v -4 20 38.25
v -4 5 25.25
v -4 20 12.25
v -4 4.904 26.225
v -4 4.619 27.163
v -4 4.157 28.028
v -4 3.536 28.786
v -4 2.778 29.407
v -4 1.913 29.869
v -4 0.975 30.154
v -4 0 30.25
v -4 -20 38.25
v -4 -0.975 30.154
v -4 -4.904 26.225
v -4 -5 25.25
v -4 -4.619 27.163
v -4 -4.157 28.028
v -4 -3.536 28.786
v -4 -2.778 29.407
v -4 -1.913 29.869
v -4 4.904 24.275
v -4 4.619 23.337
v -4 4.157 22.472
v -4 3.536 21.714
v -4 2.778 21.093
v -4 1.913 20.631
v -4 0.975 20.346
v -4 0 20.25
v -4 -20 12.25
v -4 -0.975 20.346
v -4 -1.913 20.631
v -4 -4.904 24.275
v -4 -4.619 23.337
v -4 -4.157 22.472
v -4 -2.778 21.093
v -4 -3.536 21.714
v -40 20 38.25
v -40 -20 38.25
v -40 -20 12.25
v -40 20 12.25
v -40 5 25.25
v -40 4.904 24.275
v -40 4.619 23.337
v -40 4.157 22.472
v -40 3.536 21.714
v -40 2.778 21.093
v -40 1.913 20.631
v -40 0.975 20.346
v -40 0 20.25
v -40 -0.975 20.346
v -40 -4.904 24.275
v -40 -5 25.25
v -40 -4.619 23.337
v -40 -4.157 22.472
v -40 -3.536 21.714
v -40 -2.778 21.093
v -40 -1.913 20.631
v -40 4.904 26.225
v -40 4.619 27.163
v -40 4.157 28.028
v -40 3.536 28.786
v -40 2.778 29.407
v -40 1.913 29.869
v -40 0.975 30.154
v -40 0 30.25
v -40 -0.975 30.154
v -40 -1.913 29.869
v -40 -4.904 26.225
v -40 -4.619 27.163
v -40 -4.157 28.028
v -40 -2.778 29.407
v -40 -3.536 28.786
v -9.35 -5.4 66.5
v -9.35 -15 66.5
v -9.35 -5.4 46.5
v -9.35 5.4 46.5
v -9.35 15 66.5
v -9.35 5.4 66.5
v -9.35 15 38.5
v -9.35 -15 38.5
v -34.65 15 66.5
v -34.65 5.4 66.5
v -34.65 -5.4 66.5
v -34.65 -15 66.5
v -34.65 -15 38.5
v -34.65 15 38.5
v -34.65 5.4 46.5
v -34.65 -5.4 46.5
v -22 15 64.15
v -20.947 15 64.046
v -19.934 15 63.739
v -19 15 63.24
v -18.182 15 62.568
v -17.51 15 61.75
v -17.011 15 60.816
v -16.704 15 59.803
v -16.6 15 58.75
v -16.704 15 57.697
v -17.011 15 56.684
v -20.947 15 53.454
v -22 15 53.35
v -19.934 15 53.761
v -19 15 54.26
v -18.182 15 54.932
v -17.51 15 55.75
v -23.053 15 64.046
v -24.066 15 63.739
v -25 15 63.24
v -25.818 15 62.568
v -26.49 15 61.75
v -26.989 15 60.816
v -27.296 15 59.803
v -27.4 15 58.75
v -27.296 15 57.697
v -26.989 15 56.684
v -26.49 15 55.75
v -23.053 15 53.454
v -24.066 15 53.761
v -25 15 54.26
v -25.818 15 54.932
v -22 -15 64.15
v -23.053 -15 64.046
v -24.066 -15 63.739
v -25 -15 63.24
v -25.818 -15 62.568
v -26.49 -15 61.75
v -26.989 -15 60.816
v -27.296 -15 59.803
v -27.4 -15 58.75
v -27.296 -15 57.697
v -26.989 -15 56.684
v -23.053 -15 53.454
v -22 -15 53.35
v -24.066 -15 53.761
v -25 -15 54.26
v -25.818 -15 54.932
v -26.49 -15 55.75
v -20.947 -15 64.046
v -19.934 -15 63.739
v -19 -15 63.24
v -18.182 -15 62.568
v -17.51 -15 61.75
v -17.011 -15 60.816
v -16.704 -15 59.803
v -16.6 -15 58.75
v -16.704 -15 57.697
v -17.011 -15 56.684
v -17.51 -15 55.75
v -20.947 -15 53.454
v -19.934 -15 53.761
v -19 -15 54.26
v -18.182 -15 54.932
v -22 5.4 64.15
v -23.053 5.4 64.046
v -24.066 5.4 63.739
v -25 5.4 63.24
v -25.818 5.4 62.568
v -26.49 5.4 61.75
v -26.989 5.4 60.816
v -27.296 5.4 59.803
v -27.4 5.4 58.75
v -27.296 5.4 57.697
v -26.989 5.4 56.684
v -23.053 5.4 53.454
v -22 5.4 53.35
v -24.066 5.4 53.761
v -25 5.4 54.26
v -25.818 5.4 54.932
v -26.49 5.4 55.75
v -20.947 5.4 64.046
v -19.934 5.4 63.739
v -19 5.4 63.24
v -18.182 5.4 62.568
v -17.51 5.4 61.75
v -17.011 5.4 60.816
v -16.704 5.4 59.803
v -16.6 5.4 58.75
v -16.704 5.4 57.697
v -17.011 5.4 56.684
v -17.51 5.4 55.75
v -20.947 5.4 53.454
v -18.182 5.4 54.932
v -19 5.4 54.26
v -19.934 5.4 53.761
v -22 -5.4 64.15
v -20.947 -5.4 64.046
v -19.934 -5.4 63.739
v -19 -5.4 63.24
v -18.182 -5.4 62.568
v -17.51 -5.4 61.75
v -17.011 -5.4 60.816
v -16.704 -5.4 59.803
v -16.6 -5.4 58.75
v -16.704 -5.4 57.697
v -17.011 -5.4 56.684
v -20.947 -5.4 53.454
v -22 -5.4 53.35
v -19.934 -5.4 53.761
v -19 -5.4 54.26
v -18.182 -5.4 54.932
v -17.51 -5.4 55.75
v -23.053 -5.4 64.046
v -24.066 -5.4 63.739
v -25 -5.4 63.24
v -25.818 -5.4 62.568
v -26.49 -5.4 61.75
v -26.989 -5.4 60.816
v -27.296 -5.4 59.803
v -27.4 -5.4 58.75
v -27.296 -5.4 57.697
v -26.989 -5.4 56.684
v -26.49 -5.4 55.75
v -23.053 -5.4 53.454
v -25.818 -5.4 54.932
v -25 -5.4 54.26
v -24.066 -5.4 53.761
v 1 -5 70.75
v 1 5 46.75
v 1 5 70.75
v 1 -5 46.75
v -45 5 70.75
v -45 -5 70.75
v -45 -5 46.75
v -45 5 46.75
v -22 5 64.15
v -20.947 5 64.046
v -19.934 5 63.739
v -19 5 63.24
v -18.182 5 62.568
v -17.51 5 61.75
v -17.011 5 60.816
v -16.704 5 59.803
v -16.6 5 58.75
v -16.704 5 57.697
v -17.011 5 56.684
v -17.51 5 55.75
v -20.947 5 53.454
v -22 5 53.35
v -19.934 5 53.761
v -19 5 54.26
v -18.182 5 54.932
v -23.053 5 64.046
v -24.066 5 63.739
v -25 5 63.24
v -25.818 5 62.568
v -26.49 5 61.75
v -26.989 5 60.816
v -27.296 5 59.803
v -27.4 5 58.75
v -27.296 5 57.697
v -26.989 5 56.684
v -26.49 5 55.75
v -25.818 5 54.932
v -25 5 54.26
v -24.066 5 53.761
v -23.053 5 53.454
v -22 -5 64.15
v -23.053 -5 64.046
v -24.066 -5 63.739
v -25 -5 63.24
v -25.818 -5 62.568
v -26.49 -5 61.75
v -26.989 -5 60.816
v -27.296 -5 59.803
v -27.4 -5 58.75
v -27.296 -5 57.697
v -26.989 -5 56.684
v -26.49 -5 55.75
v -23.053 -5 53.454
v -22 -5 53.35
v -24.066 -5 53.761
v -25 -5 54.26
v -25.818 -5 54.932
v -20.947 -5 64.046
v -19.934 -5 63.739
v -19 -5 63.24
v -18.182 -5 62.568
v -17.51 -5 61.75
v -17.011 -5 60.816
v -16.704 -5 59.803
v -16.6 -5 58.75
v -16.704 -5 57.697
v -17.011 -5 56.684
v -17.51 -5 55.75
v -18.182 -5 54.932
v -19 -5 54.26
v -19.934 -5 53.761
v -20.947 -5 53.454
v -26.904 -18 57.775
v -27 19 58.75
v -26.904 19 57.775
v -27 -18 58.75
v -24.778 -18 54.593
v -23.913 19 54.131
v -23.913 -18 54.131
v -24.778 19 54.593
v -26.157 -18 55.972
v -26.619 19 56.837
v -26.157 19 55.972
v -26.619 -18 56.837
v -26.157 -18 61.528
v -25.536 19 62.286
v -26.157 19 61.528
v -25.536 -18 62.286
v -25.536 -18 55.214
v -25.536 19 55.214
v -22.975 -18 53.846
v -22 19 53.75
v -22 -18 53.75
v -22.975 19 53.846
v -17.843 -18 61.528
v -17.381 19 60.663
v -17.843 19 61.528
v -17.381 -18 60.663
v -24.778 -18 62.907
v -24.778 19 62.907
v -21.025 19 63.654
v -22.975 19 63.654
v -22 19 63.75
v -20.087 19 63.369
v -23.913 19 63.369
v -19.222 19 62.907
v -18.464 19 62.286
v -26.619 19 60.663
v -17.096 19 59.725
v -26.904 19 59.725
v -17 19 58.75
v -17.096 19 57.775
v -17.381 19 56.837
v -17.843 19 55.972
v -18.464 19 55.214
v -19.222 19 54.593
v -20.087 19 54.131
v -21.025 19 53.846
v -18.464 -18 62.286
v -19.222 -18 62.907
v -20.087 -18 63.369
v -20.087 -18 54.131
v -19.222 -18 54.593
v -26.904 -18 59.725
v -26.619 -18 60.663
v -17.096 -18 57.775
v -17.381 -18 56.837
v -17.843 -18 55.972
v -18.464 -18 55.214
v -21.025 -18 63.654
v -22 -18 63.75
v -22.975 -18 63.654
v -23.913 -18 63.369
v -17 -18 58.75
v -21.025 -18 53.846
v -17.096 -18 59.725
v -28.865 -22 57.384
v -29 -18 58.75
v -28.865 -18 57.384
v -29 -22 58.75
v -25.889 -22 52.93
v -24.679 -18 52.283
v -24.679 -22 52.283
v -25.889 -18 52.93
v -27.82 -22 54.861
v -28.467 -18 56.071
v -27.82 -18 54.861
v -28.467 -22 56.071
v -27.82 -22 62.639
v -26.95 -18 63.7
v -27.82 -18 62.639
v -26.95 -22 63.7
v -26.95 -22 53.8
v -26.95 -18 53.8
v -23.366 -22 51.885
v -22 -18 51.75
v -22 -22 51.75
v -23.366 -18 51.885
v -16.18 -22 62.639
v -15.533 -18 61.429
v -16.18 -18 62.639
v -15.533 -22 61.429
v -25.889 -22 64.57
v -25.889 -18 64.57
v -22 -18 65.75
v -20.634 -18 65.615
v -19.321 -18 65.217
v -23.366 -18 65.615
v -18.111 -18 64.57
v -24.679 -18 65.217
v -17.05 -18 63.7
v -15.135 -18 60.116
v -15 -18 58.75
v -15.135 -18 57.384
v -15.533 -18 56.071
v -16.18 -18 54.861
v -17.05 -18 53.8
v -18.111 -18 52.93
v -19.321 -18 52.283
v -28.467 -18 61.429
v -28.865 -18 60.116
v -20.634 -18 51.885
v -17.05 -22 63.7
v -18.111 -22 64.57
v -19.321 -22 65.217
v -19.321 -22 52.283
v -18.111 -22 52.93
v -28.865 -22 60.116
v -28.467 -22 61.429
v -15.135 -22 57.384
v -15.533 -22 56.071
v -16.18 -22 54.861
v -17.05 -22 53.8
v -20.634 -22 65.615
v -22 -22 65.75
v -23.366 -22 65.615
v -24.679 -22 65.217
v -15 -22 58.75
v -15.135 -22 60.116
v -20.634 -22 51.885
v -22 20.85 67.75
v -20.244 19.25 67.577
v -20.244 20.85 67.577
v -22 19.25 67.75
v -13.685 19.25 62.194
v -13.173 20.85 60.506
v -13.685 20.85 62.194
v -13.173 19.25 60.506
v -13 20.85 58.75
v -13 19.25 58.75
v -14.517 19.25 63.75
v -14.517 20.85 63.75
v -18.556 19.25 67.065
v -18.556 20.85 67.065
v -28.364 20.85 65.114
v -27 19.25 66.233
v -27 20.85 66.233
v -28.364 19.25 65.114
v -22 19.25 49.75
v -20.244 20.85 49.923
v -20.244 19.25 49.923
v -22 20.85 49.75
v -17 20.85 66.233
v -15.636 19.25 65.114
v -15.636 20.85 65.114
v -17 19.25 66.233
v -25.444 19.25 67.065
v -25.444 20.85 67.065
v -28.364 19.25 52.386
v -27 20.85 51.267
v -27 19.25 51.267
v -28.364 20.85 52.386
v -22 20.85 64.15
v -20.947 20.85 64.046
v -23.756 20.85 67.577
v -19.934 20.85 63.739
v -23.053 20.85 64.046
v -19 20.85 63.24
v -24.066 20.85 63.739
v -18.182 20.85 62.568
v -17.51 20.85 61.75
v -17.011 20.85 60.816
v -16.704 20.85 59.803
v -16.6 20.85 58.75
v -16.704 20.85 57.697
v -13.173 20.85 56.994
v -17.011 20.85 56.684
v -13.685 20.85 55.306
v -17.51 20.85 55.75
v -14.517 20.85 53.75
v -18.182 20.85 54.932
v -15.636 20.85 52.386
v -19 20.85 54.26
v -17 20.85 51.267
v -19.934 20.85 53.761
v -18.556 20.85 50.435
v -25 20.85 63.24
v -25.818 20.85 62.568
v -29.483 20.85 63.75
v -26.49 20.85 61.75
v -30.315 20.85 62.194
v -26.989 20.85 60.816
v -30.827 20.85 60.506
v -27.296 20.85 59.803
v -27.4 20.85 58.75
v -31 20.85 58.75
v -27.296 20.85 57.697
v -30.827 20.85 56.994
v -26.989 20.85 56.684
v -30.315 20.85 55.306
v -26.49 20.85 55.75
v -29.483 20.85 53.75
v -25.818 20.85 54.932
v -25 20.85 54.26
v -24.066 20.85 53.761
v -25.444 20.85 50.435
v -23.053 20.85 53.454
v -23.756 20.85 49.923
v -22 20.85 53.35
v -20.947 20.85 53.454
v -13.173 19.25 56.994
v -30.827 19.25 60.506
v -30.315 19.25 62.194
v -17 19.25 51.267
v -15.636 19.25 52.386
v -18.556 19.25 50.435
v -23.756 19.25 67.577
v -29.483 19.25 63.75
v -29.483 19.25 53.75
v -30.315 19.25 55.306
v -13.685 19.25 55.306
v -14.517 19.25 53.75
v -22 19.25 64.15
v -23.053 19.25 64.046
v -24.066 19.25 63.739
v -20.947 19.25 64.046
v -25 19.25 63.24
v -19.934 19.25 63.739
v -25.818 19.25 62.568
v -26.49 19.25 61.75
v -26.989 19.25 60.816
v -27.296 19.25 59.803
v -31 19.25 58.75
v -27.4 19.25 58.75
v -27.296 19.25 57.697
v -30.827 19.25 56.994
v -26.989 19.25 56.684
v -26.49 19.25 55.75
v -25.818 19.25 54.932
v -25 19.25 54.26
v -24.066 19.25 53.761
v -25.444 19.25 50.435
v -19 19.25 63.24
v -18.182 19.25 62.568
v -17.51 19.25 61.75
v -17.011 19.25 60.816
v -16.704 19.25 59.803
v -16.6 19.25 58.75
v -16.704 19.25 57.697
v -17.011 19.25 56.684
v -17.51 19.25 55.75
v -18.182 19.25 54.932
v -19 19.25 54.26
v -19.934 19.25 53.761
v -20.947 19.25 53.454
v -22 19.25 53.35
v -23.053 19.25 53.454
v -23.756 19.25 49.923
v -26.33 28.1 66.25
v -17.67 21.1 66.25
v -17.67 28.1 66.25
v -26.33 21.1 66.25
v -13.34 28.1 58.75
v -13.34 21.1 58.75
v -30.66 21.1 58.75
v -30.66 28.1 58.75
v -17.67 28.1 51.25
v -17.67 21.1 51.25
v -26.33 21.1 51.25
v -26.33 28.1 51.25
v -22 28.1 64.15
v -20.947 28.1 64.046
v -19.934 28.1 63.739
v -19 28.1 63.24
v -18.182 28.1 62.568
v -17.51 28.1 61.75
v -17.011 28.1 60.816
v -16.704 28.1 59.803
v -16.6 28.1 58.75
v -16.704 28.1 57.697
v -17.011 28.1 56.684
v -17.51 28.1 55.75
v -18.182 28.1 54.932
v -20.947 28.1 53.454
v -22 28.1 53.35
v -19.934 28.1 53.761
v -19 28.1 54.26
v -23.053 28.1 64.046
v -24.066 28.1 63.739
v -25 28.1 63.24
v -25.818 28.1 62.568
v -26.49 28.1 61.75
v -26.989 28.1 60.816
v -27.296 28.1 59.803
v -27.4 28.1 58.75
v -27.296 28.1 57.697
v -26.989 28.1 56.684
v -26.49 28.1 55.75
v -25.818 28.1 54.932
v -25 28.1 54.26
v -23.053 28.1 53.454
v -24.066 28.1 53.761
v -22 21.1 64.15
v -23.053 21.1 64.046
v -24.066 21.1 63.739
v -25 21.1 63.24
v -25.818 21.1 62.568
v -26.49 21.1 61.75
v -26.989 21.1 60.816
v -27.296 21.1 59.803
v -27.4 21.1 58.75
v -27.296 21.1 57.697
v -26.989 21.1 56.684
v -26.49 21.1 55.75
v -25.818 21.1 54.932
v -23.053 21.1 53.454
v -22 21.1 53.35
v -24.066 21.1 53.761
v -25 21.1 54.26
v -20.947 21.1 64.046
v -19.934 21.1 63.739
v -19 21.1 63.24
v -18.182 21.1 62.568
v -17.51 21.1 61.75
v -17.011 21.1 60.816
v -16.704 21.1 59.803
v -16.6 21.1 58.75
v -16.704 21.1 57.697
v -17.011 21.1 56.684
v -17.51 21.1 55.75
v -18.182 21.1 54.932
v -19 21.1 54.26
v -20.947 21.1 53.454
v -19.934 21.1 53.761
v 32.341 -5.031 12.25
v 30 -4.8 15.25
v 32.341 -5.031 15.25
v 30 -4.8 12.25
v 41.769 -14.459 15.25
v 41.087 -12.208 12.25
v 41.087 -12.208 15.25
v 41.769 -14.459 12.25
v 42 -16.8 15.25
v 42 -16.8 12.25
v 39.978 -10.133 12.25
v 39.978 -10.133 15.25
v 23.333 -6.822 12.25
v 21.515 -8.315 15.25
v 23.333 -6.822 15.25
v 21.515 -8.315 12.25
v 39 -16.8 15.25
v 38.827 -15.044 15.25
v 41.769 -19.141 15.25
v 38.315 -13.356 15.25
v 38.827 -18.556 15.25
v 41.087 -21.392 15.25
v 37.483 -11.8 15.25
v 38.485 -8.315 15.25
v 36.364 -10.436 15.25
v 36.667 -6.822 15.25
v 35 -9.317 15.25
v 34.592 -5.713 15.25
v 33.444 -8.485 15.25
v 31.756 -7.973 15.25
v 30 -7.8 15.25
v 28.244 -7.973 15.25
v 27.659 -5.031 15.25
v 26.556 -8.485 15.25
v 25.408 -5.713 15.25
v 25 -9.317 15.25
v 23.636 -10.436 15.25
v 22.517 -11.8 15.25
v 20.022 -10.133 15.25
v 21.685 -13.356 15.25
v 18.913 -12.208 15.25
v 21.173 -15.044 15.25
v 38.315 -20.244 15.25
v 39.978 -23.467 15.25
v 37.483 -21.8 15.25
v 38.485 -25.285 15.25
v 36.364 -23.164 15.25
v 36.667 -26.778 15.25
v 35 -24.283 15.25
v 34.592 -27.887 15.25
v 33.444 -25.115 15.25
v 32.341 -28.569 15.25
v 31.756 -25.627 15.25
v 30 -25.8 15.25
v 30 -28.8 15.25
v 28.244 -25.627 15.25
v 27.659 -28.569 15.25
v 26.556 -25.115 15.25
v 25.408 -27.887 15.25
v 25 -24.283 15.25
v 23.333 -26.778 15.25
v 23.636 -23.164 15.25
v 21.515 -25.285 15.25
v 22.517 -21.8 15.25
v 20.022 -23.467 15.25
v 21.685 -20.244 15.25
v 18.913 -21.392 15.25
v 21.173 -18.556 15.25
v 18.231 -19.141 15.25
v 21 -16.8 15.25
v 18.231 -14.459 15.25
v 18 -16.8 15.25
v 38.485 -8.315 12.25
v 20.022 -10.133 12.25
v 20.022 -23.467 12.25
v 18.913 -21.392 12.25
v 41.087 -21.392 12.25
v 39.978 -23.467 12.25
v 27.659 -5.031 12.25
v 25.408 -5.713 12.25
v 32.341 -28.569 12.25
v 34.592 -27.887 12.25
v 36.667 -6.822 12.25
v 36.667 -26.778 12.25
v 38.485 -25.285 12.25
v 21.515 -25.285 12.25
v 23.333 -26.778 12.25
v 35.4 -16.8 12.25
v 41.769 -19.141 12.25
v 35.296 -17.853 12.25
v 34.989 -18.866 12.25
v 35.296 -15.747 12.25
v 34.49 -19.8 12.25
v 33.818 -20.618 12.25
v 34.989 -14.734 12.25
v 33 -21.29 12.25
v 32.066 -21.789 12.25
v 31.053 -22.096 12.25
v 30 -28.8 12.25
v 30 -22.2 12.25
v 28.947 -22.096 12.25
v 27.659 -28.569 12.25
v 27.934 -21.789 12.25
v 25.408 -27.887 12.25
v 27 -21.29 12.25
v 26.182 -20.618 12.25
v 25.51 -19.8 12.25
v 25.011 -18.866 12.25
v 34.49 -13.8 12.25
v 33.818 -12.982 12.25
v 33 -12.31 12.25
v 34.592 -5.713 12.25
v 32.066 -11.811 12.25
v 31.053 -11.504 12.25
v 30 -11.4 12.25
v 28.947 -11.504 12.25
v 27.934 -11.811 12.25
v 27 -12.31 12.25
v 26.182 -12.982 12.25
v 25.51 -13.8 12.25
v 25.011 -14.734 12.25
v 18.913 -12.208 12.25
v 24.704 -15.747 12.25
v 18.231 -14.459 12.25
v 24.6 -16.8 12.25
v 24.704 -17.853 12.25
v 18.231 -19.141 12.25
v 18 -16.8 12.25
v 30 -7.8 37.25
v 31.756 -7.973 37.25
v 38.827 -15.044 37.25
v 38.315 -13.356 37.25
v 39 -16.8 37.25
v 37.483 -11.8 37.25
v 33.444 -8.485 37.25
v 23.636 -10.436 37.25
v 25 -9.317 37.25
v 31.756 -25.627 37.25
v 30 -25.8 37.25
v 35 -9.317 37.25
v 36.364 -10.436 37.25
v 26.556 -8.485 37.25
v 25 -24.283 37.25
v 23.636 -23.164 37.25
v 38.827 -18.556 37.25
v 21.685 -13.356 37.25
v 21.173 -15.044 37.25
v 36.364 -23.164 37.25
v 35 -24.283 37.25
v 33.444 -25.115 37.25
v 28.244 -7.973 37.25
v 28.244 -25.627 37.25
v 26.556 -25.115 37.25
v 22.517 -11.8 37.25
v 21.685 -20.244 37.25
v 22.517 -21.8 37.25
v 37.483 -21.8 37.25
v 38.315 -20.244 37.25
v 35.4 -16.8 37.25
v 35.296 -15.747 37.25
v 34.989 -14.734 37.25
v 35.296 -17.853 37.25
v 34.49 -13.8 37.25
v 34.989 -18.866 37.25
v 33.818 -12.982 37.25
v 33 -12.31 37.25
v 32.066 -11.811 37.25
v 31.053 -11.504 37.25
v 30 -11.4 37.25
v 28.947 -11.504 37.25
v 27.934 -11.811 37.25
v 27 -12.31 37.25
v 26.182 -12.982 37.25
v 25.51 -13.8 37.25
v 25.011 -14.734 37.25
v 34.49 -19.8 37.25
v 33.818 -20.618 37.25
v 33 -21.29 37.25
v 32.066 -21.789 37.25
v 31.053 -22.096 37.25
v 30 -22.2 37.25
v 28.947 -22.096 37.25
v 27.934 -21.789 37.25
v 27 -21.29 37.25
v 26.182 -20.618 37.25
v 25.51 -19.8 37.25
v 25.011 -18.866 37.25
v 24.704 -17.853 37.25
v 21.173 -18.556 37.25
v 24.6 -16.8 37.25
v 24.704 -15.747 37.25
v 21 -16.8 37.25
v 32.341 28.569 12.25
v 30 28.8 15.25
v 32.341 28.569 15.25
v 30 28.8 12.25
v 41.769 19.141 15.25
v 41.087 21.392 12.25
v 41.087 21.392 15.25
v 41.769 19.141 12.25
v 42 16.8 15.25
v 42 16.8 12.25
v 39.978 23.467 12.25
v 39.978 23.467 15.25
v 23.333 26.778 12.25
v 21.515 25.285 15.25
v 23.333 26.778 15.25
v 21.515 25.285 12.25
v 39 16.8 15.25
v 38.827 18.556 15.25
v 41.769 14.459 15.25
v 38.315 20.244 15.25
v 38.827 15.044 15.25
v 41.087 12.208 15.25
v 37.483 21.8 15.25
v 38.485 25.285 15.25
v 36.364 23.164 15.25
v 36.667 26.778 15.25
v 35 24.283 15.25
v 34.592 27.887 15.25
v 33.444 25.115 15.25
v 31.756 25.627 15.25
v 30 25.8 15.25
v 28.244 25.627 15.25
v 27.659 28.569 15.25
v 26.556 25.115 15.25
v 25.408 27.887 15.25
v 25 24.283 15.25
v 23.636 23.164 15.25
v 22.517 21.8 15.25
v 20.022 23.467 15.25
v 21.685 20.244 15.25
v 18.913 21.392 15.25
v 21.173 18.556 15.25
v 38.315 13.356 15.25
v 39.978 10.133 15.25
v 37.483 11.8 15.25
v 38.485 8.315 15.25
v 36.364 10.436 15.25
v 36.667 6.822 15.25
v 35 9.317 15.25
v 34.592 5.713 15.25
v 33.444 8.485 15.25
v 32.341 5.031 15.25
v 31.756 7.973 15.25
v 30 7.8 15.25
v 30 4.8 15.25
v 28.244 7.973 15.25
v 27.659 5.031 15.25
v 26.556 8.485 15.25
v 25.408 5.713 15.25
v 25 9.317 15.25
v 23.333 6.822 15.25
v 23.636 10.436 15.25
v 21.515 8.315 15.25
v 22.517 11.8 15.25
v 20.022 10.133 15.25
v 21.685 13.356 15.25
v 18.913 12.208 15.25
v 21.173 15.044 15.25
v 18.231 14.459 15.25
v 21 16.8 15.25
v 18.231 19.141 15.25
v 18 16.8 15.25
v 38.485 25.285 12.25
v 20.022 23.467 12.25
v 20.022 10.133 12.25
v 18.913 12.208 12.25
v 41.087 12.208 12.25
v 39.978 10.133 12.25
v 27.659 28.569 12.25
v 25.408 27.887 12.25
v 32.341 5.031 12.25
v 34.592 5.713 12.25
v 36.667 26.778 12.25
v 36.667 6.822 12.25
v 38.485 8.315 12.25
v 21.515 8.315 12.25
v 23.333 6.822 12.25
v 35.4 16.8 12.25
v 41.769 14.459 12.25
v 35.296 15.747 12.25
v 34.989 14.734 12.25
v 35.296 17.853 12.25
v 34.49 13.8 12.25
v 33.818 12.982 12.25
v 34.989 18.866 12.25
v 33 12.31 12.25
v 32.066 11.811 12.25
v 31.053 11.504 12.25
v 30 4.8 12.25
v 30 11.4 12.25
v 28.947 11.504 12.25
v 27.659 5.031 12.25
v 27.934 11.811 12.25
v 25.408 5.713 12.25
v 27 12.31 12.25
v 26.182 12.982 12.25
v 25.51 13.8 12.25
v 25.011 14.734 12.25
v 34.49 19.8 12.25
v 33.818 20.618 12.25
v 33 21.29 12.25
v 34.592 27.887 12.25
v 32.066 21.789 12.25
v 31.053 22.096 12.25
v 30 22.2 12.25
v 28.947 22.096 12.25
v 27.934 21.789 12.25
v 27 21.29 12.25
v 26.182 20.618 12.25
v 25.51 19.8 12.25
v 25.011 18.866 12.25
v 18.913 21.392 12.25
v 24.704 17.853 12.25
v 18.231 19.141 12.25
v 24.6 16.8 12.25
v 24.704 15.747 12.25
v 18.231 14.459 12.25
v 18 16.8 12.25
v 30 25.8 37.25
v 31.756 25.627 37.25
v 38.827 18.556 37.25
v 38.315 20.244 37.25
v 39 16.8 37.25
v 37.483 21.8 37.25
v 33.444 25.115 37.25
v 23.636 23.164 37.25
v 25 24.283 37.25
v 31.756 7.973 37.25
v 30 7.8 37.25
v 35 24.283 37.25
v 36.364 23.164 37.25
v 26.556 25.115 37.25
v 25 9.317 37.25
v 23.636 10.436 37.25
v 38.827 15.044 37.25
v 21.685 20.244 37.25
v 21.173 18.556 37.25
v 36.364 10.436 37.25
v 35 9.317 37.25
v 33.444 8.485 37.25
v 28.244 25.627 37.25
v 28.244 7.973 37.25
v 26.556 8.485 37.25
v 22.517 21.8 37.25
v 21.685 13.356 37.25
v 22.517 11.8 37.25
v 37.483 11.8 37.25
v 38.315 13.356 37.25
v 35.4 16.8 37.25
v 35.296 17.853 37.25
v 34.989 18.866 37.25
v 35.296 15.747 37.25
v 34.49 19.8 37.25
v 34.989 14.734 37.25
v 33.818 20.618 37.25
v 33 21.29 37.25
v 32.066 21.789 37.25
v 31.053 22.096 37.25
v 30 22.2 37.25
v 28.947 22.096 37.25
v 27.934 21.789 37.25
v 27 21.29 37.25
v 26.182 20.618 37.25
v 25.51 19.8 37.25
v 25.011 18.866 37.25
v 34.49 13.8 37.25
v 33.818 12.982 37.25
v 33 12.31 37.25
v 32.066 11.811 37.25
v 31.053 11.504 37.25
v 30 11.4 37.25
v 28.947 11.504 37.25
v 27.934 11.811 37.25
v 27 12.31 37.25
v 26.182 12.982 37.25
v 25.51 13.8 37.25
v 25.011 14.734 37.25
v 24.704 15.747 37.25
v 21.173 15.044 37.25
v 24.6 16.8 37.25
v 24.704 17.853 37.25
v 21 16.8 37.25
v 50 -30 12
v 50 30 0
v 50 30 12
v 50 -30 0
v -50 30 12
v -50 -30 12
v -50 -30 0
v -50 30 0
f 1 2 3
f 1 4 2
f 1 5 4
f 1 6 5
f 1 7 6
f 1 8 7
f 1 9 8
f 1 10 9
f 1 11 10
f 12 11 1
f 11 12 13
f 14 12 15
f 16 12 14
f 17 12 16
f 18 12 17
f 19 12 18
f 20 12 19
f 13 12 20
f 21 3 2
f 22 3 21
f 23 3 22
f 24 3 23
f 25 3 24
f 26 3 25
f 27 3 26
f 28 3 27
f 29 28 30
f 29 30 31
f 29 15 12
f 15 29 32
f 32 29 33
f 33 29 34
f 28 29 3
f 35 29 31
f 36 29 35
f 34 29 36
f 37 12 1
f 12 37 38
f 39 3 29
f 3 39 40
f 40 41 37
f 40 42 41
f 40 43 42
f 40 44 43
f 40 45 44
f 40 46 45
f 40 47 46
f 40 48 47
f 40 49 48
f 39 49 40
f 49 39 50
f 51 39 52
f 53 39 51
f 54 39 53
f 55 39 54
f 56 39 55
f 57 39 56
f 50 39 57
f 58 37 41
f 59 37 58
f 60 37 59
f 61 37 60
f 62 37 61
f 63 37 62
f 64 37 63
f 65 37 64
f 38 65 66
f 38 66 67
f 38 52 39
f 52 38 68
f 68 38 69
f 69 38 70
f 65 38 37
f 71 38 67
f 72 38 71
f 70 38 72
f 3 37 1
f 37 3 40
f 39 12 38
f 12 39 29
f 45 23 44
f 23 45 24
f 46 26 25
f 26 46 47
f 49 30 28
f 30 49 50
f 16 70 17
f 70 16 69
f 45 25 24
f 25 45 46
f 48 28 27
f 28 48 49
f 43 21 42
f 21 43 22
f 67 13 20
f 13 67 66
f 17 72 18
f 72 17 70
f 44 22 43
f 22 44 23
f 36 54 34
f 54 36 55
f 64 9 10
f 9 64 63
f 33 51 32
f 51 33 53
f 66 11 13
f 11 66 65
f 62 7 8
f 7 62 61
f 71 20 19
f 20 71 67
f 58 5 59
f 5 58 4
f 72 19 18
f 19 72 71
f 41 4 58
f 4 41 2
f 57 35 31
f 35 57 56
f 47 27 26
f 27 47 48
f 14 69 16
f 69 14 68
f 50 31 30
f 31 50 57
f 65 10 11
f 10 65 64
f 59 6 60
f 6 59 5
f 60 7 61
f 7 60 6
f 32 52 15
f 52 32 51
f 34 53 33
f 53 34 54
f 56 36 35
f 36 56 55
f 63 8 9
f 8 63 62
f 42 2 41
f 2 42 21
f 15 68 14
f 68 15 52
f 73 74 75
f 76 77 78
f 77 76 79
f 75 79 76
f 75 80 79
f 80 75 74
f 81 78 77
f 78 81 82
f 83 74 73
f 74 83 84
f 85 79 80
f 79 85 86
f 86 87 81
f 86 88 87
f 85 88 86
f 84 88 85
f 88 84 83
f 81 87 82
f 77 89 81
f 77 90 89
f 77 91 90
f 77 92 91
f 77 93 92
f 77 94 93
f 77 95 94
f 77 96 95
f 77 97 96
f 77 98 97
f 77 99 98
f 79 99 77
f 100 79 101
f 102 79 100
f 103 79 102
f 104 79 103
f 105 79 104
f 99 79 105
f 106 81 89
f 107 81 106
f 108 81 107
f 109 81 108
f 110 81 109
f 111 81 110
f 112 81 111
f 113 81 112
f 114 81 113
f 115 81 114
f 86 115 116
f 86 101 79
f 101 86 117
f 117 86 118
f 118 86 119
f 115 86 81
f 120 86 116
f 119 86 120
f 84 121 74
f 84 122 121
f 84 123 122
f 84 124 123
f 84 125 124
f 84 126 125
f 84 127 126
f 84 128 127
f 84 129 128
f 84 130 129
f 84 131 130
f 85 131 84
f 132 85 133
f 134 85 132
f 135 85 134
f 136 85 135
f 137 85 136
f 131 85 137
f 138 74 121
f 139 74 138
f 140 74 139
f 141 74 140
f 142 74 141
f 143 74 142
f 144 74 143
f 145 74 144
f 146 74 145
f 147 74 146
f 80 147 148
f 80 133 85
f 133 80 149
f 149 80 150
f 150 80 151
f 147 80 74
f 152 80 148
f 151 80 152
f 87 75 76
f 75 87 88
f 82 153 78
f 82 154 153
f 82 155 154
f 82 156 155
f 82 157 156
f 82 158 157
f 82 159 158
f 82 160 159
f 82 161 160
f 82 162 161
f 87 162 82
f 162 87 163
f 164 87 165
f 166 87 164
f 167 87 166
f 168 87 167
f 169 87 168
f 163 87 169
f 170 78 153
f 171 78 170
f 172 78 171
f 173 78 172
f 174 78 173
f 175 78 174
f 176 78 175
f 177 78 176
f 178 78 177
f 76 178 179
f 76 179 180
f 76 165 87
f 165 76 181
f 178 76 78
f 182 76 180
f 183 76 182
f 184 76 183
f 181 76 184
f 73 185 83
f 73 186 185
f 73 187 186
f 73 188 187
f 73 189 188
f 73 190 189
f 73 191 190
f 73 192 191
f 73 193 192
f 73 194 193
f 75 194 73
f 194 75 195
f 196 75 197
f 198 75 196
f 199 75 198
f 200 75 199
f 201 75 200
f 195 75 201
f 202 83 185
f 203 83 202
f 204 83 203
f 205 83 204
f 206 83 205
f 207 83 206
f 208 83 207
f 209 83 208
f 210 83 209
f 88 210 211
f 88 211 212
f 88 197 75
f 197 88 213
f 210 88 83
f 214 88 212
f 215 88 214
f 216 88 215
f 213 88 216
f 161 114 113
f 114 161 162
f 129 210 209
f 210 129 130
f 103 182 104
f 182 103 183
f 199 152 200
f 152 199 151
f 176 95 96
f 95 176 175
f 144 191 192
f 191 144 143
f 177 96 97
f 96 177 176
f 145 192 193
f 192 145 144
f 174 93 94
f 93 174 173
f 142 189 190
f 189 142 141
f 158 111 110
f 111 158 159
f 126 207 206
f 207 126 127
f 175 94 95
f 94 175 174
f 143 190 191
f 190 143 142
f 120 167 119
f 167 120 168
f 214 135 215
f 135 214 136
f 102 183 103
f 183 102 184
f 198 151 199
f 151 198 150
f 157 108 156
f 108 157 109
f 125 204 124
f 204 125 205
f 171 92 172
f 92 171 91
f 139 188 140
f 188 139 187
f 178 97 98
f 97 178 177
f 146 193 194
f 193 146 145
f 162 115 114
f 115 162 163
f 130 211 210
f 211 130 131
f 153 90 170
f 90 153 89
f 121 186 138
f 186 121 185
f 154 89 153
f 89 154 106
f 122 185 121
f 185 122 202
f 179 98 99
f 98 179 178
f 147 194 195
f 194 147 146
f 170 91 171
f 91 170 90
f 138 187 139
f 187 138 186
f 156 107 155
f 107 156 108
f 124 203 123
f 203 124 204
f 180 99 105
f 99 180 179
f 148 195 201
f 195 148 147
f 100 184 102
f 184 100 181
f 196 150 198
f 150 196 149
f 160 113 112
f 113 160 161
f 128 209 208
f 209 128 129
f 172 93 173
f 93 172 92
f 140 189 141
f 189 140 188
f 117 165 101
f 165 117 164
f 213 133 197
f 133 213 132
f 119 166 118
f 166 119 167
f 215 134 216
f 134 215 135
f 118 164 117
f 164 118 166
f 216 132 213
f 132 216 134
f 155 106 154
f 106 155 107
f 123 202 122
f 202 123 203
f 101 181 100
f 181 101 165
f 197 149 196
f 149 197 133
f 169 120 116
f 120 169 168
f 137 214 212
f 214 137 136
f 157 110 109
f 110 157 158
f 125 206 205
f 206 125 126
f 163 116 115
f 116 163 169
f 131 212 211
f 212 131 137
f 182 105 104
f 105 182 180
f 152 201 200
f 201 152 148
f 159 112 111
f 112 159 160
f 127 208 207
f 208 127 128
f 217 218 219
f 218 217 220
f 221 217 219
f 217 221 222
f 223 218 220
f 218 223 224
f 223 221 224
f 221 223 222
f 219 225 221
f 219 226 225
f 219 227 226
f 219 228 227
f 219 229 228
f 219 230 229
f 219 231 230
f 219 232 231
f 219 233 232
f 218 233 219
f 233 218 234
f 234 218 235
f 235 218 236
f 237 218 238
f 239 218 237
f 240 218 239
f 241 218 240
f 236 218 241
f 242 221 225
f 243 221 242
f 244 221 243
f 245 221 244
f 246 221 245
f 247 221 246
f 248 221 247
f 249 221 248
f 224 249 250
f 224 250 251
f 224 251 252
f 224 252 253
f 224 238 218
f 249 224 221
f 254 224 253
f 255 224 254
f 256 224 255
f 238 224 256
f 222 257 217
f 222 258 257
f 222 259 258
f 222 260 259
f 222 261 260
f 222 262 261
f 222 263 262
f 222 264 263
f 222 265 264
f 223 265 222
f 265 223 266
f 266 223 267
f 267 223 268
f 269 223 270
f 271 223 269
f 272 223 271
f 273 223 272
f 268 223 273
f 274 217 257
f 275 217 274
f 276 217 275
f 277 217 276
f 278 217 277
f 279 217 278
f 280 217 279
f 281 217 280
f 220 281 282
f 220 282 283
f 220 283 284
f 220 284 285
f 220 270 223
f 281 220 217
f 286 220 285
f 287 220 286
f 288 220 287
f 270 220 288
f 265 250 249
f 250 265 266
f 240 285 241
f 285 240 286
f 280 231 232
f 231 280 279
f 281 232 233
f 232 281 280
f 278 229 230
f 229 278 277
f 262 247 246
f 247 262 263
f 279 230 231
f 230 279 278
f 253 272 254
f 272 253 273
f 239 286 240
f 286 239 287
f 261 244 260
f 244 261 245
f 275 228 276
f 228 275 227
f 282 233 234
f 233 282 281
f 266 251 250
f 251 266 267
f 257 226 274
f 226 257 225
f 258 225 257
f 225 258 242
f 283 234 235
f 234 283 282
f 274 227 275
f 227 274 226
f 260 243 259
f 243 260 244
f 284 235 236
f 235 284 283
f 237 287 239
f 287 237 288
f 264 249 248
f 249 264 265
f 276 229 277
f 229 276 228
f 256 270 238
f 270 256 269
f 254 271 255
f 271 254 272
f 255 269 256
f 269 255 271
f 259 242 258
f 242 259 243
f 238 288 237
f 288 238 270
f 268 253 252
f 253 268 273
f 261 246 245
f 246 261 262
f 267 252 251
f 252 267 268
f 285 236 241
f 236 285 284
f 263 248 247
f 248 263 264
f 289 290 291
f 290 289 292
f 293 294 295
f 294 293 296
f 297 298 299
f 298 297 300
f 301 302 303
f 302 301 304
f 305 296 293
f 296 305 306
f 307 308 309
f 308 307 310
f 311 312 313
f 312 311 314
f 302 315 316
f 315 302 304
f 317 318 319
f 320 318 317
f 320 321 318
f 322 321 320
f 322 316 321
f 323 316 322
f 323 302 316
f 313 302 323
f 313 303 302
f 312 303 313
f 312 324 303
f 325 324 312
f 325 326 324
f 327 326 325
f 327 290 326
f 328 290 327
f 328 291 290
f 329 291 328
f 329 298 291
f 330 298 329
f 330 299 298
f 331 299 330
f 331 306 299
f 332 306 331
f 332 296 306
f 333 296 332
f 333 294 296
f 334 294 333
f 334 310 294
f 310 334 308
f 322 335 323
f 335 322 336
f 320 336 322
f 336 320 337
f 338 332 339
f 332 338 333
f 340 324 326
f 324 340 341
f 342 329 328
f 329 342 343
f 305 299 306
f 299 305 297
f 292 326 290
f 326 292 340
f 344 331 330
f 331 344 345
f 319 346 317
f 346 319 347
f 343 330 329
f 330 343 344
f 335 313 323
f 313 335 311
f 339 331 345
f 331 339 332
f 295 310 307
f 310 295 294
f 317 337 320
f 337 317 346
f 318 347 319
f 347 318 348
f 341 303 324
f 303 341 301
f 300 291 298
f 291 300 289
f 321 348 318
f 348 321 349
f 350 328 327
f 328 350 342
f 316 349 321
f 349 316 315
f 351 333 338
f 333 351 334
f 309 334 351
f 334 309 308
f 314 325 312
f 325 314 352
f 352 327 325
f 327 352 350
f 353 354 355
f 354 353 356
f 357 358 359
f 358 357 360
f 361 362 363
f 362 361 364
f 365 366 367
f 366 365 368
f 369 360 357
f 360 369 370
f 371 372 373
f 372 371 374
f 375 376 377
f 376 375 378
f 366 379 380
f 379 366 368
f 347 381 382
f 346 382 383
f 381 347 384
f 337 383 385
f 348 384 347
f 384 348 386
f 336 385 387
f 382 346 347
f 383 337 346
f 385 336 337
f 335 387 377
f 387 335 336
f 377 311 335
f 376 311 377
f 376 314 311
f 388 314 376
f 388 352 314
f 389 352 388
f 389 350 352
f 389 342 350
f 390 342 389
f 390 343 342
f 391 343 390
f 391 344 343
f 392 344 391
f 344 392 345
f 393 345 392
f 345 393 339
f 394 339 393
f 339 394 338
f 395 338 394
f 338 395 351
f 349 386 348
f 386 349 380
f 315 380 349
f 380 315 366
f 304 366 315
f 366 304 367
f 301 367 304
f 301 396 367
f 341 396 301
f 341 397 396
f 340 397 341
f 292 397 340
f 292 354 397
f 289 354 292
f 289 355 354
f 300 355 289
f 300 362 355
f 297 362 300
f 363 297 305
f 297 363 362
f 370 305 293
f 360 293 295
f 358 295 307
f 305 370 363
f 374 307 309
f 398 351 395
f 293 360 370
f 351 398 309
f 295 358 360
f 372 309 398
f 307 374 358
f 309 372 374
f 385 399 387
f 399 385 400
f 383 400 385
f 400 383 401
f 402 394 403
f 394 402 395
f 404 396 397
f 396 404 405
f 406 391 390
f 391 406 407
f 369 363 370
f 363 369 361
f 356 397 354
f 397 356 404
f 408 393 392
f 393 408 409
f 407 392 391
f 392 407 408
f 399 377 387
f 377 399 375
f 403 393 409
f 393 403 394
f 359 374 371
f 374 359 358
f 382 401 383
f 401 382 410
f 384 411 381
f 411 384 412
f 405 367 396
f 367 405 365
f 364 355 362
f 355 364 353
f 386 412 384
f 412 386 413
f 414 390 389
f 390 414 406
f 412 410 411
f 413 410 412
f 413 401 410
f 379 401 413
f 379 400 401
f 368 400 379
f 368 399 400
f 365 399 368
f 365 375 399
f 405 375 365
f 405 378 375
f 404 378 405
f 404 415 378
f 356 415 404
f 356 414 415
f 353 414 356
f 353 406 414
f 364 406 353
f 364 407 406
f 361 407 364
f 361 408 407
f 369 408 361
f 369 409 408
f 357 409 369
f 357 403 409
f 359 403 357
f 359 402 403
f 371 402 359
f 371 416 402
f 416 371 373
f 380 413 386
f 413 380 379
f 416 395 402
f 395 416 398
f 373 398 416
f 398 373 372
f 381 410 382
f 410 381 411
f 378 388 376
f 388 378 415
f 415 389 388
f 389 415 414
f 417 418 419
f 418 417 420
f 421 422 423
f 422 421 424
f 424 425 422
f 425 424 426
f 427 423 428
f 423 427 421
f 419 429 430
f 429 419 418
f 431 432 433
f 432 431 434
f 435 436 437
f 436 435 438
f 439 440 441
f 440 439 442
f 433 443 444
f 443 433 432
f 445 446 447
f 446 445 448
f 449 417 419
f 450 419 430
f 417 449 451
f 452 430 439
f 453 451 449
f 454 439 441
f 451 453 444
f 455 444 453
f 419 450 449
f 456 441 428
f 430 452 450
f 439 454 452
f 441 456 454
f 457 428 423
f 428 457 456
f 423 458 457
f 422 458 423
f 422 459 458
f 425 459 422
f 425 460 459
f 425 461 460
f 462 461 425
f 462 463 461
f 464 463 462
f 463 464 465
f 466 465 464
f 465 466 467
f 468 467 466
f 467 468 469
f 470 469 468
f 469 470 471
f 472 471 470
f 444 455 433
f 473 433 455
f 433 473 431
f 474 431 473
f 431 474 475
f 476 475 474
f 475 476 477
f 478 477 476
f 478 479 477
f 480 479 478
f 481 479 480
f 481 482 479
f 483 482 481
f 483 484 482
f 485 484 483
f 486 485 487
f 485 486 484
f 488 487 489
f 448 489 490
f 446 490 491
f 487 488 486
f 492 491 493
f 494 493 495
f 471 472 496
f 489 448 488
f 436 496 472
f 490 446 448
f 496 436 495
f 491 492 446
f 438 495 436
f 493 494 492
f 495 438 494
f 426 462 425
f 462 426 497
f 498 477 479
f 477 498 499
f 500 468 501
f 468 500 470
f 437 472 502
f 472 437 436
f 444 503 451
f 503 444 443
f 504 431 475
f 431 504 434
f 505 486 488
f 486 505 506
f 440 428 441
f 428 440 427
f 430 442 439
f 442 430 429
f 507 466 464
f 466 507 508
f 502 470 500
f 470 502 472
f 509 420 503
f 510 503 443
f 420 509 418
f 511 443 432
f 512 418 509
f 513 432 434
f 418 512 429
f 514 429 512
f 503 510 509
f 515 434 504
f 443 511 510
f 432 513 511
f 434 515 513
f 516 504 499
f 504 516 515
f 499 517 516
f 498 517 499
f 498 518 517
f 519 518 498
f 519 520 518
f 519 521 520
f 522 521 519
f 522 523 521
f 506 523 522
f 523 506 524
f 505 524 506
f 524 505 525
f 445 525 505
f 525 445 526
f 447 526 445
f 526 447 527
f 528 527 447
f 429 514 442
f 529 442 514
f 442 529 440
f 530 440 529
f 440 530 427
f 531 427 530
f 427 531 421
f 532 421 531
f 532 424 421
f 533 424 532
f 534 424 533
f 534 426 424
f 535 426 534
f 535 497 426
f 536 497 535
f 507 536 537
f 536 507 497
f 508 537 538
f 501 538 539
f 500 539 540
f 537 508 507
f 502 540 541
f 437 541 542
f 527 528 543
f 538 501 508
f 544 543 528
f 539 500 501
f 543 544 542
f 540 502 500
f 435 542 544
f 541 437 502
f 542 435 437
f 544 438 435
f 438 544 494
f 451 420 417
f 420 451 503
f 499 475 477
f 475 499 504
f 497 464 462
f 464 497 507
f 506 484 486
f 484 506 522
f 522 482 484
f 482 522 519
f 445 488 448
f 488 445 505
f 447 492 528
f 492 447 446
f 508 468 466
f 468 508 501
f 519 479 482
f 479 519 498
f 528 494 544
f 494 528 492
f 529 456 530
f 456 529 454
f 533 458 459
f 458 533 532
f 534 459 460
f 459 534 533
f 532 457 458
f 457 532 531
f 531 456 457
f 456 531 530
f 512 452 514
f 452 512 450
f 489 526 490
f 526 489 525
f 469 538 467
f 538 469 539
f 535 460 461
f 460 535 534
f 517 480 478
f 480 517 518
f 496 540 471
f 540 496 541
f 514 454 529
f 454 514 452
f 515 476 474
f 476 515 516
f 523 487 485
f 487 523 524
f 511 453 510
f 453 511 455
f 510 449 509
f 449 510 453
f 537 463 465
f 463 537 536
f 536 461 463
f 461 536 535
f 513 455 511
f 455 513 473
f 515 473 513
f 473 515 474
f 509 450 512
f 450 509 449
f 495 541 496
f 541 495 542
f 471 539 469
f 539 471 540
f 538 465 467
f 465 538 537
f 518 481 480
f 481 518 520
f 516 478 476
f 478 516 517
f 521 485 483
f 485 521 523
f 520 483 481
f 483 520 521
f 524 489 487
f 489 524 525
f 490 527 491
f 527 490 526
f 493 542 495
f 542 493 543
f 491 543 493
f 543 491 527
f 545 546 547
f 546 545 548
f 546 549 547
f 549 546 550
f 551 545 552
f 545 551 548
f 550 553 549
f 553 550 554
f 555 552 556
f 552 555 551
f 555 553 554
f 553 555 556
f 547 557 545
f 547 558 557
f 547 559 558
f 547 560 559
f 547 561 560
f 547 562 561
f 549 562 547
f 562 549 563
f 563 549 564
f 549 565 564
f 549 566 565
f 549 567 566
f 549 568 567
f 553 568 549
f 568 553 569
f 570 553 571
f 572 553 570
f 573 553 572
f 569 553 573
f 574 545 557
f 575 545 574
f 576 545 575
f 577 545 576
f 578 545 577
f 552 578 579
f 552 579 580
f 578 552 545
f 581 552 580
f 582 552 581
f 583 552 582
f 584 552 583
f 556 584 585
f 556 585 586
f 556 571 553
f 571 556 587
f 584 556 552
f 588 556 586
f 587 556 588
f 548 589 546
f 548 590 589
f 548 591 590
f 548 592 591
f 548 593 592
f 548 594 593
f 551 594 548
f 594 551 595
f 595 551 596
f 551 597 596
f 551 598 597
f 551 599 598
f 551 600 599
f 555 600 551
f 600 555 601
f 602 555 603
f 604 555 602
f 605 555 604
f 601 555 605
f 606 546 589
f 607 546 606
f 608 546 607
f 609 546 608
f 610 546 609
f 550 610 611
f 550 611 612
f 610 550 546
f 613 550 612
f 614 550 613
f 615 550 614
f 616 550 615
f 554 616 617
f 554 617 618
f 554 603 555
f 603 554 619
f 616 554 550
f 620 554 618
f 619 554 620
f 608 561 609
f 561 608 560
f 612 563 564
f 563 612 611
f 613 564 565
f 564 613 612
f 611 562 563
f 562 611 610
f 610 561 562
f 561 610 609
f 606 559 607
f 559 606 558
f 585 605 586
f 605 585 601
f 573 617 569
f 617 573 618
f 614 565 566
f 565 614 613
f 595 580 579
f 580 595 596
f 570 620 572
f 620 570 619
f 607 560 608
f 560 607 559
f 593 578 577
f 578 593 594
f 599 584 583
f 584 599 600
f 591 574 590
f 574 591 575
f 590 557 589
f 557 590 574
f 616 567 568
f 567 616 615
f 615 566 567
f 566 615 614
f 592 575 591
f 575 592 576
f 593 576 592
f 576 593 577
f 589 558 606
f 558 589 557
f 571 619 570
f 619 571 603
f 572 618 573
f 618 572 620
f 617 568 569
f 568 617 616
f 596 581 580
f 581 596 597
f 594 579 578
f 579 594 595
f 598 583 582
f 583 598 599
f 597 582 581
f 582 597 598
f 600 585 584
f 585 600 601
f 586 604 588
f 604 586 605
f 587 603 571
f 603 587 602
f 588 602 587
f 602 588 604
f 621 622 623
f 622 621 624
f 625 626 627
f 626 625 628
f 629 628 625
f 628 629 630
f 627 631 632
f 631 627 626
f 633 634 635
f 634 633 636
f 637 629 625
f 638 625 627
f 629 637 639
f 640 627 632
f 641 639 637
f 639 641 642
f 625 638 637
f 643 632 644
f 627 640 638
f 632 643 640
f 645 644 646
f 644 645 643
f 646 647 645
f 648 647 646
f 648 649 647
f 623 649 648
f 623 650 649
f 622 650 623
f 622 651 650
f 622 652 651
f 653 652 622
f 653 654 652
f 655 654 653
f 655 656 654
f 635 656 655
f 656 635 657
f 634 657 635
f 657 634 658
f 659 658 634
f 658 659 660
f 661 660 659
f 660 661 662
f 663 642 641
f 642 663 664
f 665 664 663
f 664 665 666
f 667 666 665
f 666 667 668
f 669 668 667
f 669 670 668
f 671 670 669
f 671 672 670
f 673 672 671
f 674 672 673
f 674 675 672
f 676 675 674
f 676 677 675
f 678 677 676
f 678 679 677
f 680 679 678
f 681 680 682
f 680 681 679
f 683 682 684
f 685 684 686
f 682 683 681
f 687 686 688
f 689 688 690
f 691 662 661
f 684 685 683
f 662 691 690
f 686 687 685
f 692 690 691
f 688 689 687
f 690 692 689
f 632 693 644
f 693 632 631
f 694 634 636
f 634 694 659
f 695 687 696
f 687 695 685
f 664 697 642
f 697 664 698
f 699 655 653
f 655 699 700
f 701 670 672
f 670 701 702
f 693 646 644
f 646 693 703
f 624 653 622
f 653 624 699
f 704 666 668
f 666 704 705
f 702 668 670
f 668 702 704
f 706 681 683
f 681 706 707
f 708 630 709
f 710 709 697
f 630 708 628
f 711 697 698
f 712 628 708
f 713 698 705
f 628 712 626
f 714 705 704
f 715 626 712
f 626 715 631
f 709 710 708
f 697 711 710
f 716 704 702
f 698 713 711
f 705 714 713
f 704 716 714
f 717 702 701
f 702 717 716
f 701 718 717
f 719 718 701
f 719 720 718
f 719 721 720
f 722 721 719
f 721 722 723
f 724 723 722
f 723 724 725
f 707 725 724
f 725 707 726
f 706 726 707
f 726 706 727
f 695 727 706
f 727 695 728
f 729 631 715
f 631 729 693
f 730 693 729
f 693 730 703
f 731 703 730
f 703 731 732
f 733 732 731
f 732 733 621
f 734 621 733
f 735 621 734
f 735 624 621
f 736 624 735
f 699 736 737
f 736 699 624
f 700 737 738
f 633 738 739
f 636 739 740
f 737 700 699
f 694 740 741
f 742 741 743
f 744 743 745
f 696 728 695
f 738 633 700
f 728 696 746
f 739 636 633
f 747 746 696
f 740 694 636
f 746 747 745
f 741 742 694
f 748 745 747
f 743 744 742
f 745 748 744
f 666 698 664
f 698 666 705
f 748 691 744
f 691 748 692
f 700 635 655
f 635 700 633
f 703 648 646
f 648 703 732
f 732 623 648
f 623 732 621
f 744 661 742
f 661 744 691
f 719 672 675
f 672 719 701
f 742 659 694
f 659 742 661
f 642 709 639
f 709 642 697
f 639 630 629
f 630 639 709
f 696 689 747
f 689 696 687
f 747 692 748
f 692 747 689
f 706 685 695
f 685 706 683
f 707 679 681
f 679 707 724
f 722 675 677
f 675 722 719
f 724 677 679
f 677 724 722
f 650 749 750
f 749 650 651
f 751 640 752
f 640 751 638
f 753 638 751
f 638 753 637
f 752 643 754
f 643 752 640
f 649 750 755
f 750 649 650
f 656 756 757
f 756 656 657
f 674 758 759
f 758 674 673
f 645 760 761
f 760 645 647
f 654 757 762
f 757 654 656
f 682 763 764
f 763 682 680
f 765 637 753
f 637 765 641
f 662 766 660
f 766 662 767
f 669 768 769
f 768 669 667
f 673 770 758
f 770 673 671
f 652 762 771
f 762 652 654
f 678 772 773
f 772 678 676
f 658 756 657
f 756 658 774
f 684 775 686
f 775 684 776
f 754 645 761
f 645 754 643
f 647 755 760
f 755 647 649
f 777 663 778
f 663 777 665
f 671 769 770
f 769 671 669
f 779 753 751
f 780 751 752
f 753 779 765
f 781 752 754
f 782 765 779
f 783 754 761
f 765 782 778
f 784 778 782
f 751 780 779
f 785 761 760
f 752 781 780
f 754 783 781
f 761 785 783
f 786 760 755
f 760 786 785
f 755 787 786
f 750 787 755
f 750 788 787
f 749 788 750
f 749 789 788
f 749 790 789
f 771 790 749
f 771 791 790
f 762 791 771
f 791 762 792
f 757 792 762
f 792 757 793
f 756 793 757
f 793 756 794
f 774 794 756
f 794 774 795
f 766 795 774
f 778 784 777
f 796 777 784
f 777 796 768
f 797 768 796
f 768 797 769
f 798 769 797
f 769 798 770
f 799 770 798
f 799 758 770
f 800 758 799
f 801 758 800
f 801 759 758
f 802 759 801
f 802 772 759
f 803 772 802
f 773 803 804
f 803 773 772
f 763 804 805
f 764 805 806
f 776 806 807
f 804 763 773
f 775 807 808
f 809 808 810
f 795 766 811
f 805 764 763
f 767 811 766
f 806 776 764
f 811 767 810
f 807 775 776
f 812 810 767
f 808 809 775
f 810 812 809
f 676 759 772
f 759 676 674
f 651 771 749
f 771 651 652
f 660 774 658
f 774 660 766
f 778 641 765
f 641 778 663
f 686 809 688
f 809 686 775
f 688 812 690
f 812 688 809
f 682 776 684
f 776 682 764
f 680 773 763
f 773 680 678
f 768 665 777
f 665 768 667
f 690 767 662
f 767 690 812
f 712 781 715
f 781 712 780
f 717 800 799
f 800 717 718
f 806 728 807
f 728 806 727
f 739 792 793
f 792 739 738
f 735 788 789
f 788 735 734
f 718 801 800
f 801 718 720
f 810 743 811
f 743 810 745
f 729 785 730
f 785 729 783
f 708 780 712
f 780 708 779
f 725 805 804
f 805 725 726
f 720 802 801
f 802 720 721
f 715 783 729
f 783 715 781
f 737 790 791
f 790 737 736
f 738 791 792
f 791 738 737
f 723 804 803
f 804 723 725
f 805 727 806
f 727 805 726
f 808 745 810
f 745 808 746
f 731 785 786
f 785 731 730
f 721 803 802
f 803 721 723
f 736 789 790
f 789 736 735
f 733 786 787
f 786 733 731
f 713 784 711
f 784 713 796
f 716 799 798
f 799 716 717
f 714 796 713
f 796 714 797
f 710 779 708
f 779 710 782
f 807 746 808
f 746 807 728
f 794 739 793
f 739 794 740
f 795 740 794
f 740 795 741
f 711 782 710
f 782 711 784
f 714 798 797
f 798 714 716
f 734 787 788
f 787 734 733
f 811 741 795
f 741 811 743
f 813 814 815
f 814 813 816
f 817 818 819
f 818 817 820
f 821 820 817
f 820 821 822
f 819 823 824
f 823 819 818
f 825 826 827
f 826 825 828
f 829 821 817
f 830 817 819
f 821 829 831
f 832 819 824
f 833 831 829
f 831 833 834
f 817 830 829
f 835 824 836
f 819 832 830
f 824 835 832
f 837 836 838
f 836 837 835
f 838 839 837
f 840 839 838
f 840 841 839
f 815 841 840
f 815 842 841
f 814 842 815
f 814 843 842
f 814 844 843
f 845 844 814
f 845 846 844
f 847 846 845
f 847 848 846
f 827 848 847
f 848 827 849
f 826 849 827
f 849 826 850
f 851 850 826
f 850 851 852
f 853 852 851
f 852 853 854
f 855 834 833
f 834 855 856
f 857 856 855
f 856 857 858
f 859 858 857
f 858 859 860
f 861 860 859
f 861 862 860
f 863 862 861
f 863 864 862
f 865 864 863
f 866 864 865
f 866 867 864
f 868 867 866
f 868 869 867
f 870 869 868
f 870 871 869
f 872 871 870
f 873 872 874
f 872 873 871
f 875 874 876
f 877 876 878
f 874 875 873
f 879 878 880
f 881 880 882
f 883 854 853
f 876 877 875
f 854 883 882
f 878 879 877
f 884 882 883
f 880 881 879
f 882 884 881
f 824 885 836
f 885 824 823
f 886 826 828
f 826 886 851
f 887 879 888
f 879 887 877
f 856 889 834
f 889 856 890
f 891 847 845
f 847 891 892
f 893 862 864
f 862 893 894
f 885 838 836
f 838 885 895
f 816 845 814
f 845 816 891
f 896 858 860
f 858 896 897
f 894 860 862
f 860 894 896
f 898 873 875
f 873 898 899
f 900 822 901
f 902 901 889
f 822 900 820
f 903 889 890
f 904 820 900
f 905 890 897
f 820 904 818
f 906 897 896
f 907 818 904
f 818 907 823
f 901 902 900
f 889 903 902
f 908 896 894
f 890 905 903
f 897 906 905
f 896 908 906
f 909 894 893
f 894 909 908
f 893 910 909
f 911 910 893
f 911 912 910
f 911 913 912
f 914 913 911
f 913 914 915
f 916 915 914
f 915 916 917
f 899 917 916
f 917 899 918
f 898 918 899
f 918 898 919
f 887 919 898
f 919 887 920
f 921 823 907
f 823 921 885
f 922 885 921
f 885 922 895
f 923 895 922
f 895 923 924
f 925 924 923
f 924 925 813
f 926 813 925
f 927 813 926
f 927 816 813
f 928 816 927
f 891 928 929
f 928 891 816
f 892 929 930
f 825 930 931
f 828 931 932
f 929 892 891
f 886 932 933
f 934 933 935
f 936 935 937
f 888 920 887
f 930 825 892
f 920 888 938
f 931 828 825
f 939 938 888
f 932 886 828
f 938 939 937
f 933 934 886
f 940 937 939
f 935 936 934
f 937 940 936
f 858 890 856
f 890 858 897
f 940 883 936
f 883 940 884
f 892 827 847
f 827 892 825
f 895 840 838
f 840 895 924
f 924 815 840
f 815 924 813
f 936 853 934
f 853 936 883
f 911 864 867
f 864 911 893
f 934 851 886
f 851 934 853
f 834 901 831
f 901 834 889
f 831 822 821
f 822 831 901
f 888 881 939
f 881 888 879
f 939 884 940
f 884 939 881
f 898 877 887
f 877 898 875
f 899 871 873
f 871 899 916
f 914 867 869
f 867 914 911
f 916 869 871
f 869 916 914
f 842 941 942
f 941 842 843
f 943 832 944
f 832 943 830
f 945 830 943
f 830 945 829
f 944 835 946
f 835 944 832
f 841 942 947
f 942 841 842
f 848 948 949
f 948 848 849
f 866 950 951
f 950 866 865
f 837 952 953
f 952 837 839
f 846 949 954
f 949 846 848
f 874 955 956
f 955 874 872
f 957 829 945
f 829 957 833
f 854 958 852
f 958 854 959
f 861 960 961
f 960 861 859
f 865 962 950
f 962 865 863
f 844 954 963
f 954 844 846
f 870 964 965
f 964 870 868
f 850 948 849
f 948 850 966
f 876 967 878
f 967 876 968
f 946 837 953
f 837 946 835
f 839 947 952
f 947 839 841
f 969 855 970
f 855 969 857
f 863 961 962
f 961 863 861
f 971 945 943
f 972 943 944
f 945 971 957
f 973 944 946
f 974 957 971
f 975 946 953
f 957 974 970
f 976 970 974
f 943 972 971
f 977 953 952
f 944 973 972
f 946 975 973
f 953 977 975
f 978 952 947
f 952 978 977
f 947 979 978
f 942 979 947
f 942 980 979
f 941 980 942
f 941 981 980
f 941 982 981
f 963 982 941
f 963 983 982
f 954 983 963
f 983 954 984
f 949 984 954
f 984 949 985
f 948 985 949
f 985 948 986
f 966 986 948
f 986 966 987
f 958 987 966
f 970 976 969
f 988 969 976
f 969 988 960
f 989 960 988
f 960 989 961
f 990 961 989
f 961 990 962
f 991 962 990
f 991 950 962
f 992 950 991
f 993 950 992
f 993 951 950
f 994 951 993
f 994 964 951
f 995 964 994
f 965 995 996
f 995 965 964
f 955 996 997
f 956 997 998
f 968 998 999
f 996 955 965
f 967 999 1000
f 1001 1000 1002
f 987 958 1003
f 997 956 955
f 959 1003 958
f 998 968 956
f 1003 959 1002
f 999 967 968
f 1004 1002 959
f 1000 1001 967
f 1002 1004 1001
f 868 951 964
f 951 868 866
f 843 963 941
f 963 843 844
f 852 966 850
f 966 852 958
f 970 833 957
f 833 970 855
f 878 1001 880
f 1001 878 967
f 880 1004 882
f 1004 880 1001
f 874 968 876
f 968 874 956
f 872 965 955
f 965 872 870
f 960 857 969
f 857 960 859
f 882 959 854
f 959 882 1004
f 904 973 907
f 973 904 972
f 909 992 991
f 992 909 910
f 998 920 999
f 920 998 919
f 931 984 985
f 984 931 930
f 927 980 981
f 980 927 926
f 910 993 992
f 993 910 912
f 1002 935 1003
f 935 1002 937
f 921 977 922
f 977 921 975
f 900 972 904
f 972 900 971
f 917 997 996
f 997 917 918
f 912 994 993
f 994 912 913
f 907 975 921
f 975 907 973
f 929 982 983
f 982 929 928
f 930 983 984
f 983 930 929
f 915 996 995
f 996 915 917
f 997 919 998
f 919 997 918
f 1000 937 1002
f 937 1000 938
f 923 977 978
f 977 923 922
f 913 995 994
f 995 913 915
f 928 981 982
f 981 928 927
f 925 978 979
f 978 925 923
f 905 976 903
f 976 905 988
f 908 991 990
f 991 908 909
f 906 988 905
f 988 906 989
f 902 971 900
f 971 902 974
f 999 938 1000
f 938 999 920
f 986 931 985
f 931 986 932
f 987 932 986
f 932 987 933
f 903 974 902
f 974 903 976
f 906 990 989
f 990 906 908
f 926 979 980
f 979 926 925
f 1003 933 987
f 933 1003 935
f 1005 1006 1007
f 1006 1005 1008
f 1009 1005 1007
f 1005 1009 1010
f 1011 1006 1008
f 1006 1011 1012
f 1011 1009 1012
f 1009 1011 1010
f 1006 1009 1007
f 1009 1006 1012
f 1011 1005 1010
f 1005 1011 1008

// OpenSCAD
$fn = 32;

// ------------------------------------------------------------------------
// Indexing jig: plate 100 x 60 mm, pin d10
// Every part is its own module, assembly() places every instance.
// ------------------------------------------------------------------------

// --- part 1 ---
module jig_plate() {
  difference() {
    translate([-50, -30, 0]) cube([100, 60, 12]);
  }
}

// --- part 2 ---
module locator_block() {
  difference() {
    translate([-18, -20, 0]) cube([36, 40, 26]);
    translate([0, 0, 13]) rotate([0, 90, 0]) cylinder(h = 38, d = 10, center = true);
  }
}

// --- part 3 ---
module index_fork() {
  difference() {
    translate([-12.65, -15, 0]) cube([25.3, 30, 28]);
    translate([-13.65, -5.4, 8]) cube([27.3, 10.8, 21]);
    translate([0, 0, 20.25]) rotate([90, 0, 0]) cylinder(h = 32, d = 10.8, center = true);
  }
}

// --- part 4 ---
module index_arm() {
  difference() {
    translate([-23, -5, 0]) cube([46, 10, 24]);
    translate([0, 0, 12]) rotate([90, 0, 0]) cylinder(h = 12, d = 10.8, center = true);
  }
}

// --- part 5 ---
module index_pin() {
  rotate([0, 90, 0]) cylinder(h = 38, d = 10, center = true);
  translate([-22, 0, 0]) rotate([0, 90, 0]) cylinder(h = 4, d = 14);
}

// --- part 6 ---
module pin_washer() {
  difference() {
      translate([0, 0, 0]) cylinder(h = 1.6, d = 18);
      translate([0, 0, -1]) cylinder(h = 3.6, d = 10.8);
    }
}

// --- part 7 ---
module lock_nut() {
  difference() {
    linear_extrude(height = 7) polygon(points = [[8.66, 0], [4.33, 7.5], [-4.33, 7.5], [-8.66, 0], [-4.33, -7.5], [4.33, -7.5]]);
    translate([0, 0, -1]) cylinder(h = 9, d = 10.8);
  }
}

// --- part 8 ---
module guide_bush_a() {
  difference() {
    union() {
      cylinder(h = 3, d = 24);
      translate([0, 0, 3]) cylinder(h = 22, d = 18);
    }
    translate([0, 0, -1]) cylinder(h = 27, d = 10.8);
  }
}

// --- part 9 ---
module guide_bush_b() {
  difference() {
    union() {
      cylinder(h = 3, d = 24);
      translate([0, 0, 3]) cylinder(h = 22, d = 18);
    }
    translate([0, 0, -1]) cylinder(h = 27, d = 10.8);
  }
}

// --- assembly ---
module assembly() {
  color([0.80, 0.24, 0.20]) translate([0, 0, 0]) rotate([0, 0, 0]) jig_plate();
  color([0.20, 0.45, 0.75]) translate([-22, 0, 12.25]) rotate([0, 0, 0]) locator_block();
  color([0.25, 0.62, 0.32]) translate([-22, 0, 38.5]) rotate([0, 0, 0]) index_fork();
  color([0.92, 0.70, 0.18]) translate([-22, 0, 46.75]) rotate([0, 0, 0]) index_arm();
  color([0.58, 0.35, 0.70]) translate([-22, 0, 58.75]) rotate([0, 0, 90]) index_pin();
  color([0.16, 0.66, 0.66]) translate([-22, 20.85, 58.75]) rotate([90, 0, 0]) pin_washer();
  color([0.85, 0.48, 0.18]) translate([-22, 28.1, 58.75]) rotate([90, 0, 0]) lock_nut();
  color([0.55, 0.60, 0.65]) translate([30, -16.8, 12.25]) rotate([0, 0, 0]) guide_bush_a();
  color([0.75, 0.30, 0.55]) translate([30, 16.8, 12.25]) rotate([0, 0, 0]) guide_bush_b();
}

assembly();
